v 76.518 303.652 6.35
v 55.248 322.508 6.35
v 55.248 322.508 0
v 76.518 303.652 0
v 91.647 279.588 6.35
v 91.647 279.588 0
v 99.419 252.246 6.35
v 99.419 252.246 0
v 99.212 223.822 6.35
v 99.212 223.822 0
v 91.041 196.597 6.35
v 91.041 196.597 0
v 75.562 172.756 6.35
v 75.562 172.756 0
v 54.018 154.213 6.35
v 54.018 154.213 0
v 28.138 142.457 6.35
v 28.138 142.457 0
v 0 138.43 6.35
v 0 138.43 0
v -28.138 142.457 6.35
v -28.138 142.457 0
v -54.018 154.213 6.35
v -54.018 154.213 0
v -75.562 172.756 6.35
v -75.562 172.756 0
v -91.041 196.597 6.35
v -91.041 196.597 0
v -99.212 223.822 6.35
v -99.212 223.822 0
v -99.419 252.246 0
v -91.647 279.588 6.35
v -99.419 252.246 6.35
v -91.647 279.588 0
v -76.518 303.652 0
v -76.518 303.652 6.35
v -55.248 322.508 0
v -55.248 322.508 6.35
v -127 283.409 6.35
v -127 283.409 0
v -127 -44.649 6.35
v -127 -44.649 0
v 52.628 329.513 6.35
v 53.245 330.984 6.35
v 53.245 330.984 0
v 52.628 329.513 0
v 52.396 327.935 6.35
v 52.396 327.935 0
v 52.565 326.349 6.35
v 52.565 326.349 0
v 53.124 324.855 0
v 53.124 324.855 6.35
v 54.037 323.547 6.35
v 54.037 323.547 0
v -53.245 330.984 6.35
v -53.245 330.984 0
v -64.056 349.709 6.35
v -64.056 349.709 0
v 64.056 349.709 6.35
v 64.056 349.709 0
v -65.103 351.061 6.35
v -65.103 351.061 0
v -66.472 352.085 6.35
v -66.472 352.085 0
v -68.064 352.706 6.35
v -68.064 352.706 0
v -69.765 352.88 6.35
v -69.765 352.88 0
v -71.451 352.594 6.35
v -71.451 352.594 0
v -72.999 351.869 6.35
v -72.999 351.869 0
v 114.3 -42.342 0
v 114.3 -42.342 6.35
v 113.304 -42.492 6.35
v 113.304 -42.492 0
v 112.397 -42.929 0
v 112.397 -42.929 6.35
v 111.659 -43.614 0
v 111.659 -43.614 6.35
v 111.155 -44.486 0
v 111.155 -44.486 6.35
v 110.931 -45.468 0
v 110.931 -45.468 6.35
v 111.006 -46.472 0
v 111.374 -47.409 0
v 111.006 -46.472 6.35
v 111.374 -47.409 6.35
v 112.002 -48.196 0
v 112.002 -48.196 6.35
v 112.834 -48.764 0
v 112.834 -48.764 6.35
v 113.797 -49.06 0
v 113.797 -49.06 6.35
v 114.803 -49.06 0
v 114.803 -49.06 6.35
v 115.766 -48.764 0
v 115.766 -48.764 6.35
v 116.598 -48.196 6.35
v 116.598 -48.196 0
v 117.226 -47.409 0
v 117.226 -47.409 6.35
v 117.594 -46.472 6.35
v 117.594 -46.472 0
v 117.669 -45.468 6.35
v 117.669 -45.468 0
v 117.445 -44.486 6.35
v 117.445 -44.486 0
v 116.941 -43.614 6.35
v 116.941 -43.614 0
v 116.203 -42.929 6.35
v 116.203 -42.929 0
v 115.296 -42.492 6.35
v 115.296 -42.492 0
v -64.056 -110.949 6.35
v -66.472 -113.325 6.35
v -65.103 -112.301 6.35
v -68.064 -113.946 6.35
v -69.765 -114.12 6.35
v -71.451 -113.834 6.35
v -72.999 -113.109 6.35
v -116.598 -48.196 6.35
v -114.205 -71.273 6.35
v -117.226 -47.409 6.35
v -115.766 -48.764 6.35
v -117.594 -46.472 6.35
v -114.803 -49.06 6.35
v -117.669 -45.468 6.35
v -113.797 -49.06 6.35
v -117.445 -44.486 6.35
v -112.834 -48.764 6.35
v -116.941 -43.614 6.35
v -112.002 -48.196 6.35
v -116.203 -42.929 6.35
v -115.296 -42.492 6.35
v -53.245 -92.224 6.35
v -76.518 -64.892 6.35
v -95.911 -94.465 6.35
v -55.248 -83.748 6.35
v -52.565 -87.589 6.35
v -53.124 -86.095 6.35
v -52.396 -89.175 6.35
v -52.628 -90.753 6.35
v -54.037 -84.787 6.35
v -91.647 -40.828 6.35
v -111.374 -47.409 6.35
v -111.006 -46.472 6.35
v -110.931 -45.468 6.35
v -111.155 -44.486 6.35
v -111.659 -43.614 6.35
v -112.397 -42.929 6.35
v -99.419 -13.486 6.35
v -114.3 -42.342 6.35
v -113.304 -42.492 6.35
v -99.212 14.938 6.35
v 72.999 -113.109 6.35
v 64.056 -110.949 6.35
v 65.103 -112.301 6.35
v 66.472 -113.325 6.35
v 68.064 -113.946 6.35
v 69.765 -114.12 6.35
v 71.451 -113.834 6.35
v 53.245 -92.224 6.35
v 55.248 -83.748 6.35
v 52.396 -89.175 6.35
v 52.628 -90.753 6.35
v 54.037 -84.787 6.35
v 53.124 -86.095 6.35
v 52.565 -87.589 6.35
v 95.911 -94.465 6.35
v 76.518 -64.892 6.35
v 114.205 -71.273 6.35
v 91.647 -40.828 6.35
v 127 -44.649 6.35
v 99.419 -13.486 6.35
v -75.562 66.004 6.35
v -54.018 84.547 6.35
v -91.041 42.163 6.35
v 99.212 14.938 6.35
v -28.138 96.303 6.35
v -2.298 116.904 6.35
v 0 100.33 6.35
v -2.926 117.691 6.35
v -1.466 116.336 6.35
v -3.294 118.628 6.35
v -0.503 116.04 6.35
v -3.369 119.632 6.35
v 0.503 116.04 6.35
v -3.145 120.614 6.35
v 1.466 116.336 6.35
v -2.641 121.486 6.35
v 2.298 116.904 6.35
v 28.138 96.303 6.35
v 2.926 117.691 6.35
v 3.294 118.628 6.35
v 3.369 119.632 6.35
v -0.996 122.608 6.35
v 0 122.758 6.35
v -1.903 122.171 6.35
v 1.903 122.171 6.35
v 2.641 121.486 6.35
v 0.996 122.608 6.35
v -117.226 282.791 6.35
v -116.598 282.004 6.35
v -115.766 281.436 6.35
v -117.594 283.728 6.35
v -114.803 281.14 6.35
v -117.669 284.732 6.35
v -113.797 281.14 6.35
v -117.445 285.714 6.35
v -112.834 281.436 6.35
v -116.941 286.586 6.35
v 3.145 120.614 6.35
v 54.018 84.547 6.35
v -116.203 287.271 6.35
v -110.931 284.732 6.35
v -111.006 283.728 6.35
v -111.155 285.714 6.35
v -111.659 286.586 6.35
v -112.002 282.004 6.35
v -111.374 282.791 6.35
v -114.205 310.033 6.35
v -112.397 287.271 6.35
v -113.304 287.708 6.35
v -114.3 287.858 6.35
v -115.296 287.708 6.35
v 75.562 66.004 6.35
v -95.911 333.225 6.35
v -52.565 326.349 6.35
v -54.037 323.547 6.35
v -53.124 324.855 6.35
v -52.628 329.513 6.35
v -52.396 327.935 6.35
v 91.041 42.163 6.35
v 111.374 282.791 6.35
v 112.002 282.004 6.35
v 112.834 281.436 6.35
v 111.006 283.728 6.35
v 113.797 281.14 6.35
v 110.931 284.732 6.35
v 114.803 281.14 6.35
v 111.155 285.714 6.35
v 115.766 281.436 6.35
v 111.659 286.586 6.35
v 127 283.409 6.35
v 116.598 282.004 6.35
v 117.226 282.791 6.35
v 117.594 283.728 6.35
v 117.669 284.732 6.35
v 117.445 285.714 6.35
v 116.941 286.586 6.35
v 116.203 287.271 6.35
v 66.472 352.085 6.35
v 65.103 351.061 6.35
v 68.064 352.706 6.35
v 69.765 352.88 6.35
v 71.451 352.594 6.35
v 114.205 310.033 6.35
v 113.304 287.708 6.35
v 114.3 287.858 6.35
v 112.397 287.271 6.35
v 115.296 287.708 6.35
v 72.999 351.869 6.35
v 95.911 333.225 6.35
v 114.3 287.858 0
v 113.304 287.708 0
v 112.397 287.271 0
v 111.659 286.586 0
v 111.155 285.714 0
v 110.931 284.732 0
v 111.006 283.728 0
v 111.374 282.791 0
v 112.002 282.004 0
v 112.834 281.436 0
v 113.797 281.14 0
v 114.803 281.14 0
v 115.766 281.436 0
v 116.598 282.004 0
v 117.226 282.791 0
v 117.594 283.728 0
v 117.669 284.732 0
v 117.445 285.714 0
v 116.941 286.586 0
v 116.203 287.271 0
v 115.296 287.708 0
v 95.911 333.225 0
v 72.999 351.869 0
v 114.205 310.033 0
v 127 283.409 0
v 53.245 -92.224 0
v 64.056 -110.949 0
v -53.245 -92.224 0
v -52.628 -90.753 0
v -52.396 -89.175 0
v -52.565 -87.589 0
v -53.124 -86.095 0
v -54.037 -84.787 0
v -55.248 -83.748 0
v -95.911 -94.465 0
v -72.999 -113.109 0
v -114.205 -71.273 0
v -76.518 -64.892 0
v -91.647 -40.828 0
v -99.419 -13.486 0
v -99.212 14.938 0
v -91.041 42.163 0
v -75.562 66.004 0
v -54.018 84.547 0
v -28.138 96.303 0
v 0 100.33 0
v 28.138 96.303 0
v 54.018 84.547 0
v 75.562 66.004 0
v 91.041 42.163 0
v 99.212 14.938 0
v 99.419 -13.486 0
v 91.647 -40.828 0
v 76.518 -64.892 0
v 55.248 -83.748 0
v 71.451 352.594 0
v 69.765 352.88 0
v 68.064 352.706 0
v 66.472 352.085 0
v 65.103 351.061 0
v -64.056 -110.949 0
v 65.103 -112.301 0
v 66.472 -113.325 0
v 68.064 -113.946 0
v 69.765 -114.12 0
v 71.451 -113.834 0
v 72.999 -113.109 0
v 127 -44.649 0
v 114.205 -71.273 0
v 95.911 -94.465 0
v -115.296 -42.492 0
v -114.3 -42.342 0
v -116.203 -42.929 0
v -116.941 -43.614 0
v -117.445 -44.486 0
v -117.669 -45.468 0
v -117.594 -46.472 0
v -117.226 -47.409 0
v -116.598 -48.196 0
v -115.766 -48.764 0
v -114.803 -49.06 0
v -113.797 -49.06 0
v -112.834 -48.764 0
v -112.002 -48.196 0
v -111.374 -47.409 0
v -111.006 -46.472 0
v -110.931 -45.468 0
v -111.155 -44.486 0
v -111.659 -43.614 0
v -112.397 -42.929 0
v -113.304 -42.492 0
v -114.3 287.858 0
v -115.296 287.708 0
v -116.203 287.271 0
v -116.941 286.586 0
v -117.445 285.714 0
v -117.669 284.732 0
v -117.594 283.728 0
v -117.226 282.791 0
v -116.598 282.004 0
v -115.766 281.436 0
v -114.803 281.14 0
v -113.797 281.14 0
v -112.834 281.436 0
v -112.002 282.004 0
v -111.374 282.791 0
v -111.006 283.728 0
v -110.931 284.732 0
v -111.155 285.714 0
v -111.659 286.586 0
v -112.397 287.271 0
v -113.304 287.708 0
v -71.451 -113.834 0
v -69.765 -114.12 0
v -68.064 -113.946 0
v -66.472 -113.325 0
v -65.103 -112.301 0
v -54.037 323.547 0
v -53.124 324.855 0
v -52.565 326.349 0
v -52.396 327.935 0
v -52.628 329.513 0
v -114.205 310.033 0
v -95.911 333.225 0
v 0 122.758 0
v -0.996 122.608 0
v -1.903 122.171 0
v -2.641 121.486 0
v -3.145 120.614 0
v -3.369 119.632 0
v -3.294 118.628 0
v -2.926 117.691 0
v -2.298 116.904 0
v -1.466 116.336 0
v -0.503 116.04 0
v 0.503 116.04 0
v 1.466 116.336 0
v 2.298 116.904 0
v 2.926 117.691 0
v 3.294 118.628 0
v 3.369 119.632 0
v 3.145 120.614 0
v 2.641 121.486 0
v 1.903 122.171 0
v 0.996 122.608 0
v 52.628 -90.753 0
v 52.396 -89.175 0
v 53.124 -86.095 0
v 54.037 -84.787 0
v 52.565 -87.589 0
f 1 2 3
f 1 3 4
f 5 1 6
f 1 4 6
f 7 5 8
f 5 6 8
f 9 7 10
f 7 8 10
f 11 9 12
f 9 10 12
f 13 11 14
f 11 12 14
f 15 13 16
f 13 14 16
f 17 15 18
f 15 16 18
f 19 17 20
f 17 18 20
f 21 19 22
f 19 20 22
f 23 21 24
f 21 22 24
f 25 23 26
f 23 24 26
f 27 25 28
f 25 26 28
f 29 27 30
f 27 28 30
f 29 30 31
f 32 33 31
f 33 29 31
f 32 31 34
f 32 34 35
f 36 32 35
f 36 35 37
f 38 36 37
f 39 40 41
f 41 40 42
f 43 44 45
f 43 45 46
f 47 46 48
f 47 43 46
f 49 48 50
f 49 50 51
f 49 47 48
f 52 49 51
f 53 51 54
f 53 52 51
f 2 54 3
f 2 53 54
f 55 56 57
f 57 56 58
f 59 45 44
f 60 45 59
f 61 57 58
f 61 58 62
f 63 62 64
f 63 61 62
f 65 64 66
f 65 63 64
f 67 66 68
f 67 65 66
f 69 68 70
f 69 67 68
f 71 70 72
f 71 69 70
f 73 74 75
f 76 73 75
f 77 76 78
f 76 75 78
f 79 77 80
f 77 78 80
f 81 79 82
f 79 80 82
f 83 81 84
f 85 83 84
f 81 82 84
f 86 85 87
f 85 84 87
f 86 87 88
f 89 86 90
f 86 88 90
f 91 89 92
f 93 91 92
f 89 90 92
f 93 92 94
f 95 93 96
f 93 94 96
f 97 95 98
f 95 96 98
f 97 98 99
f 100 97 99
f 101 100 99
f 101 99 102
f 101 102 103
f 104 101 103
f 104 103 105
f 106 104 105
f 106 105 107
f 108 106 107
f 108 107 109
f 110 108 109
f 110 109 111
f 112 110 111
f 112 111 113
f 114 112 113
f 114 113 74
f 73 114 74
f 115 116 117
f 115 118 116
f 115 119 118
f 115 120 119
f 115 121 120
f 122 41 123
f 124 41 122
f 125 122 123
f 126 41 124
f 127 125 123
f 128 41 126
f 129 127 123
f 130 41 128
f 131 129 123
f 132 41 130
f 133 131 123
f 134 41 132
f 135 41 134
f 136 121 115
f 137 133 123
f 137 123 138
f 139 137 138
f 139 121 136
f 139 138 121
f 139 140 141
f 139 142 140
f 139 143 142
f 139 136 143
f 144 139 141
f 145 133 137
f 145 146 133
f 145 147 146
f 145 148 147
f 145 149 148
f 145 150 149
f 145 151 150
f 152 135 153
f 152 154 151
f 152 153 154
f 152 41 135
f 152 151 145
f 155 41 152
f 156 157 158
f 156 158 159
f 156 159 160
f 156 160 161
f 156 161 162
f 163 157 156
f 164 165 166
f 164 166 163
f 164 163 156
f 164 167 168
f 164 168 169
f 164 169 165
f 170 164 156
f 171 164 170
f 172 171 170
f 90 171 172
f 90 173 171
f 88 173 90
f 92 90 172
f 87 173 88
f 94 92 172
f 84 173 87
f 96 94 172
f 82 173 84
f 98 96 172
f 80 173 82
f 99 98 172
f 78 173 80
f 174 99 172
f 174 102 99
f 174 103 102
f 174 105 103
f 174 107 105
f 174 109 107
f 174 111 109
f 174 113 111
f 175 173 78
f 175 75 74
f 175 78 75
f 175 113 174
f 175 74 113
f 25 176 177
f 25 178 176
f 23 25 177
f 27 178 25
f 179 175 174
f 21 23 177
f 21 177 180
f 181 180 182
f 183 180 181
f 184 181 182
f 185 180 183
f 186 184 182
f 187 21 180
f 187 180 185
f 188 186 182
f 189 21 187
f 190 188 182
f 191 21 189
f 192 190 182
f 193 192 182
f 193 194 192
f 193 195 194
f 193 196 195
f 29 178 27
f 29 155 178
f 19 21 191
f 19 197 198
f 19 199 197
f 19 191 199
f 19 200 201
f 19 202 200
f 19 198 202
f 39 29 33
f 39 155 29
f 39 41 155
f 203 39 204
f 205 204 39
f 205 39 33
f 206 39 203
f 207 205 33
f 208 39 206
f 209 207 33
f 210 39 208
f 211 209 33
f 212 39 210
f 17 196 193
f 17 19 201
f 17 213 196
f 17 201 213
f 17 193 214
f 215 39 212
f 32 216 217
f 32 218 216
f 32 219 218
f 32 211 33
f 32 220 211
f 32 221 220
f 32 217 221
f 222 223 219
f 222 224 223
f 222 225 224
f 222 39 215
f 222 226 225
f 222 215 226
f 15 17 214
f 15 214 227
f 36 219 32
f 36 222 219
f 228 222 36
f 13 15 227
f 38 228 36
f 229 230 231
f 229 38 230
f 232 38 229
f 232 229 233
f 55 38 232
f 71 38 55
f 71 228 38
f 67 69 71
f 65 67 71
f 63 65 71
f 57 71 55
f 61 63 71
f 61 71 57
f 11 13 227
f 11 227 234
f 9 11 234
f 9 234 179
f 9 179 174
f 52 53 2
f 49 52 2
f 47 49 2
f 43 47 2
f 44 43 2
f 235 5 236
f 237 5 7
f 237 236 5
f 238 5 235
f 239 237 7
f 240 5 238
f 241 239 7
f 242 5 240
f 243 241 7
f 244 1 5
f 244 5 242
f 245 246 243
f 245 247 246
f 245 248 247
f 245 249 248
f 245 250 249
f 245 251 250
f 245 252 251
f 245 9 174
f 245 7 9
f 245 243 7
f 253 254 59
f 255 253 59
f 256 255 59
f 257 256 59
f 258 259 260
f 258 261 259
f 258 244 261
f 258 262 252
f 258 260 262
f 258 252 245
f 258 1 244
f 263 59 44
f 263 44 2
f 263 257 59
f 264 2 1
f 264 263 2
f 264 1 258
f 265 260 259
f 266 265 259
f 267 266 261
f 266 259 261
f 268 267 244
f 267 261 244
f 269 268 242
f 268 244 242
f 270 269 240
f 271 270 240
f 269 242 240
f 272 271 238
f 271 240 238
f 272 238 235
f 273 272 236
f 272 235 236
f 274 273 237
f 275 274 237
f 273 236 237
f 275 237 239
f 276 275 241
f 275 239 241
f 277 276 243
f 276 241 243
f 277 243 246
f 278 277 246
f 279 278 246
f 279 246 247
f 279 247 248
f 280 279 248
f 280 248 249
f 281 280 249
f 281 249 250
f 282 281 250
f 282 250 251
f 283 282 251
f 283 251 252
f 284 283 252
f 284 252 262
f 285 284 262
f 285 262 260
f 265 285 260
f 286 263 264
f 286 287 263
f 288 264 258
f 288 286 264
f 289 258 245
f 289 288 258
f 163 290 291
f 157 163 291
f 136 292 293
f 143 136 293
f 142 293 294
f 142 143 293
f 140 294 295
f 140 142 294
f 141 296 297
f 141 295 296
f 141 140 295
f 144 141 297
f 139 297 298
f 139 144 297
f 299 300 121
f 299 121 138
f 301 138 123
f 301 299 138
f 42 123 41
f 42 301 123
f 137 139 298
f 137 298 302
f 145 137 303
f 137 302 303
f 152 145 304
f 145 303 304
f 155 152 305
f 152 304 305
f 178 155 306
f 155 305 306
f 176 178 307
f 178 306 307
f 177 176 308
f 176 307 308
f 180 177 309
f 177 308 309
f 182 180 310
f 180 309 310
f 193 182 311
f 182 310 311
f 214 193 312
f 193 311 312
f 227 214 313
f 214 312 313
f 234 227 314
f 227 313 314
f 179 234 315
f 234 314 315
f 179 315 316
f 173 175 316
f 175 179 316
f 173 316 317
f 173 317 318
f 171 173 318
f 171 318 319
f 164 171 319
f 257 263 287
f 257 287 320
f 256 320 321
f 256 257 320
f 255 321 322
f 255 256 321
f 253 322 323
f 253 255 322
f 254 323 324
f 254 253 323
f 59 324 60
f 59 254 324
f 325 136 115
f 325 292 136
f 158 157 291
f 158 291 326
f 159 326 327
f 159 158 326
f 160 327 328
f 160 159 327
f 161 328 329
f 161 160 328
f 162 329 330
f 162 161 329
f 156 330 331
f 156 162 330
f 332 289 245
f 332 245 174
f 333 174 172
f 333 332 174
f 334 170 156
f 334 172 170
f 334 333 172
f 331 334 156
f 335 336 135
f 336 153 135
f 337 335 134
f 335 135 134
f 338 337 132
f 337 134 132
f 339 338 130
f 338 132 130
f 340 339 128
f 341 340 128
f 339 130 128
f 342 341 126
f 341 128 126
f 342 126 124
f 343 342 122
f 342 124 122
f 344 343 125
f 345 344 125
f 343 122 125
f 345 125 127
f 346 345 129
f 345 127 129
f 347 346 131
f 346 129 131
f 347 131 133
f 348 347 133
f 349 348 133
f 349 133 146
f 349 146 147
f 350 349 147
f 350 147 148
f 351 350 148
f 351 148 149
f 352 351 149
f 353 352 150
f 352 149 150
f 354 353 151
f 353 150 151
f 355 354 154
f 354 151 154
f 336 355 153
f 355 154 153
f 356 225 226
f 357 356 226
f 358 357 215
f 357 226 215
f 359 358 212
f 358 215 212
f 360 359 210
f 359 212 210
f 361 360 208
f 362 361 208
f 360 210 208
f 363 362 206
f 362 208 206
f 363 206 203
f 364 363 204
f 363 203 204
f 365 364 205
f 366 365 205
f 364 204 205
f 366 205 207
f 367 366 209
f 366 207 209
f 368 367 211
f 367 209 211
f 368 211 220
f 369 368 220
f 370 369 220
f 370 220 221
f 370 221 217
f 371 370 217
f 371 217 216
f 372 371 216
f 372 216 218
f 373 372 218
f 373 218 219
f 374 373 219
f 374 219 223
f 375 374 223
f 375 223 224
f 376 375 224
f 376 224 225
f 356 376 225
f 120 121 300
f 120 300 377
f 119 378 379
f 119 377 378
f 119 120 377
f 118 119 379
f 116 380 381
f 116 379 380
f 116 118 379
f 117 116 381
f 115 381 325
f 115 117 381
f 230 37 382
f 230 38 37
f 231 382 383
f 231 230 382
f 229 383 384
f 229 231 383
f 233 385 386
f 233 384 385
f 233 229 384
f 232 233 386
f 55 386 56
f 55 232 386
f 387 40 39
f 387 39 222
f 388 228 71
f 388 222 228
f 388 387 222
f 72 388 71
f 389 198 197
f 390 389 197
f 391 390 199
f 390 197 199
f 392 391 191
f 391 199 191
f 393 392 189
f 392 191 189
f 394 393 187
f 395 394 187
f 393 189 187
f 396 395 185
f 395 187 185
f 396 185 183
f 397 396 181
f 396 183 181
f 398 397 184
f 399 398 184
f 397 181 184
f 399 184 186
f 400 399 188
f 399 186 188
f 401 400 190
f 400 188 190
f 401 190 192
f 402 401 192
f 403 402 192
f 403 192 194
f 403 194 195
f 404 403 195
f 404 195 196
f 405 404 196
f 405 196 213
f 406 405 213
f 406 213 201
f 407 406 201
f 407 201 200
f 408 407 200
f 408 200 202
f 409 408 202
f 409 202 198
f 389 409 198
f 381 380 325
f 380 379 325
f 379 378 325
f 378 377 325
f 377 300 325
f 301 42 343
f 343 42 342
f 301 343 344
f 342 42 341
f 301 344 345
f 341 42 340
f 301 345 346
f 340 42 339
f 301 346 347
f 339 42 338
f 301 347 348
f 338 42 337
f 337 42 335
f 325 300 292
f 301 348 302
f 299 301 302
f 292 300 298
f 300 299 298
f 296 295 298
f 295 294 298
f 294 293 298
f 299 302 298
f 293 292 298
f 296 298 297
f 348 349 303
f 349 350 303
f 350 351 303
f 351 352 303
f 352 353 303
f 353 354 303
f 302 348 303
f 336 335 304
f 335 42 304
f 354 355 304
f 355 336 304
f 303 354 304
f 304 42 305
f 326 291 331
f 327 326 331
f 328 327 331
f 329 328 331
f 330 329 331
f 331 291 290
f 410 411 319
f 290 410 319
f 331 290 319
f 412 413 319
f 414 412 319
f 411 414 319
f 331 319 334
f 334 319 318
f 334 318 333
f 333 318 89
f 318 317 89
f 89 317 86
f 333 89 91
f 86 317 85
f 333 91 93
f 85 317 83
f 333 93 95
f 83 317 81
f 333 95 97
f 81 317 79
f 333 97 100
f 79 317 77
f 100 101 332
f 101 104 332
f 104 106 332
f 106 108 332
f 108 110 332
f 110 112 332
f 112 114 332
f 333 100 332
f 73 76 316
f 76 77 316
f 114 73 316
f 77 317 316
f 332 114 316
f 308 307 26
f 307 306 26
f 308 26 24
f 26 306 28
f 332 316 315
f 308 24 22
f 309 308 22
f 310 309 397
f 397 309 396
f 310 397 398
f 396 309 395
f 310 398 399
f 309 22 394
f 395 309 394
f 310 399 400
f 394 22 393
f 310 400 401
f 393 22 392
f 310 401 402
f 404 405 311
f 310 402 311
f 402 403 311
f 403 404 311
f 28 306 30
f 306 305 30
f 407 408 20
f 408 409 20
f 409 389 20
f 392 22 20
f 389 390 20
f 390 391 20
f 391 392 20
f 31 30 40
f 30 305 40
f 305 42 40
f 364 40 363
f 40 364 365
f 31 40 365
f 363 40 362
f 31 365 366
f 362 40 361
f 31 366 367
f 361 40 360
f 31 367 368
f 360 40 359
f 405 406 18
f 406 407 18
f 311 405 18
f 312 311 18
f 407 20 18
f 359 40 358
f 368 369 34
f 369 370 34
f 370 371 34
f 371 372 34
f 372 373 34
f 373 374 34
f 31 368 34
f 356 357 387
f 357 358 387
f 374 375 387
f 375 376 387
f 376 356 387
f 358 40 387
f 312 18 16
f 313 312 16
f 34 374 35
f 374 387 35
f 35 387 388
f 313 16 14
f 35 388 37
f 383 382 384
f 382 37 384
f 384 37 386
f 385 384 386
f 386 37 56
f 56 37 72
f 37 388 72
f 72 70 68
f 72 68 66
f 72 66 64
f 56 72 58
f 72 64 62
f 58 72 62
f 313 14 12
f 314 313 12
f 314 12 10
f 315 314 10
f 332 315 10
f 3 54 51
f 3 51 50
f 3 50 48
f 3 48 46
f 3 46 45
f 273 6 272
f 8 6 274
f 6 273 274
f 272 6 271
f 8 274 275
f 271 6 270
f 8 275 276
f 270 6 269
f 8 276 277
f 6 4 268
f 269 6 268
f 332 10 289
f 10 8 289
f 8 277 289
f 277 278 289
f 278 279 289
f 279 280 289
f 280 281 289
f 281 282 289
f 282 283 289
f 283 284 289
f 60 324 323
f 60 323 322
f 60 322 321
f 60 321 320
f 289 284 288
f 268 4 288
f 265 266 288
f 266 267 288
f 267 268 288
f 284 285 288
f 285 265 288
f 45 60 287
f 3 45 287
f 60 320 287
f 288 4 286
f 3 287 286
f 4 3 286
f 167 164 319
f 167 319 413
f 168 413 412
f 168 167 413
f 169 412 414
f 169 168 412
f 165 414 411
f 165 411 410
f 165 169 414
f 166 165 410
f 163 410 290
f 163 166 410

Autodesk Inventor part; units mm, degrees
ref_plane "YZ Plane" through (0, 0, 0) normal (1, 0, 0) x (0, 1, 0)
ref_plane "XZ Plane" through (0, 0, 0) normal (0, 1, 0) x (-1, 0, 0)
ref_plane "XY Plane" through (0, 0, 0) normal (0, 0, 1) x (1, 0, 0)
sketch "Sketch1" plane through (0, 0, 0) normal (0, 0, 1) x (1, 0, 0)
  arc A0 (50.165, -86.8883) -> (-50.165, -86.8883) centre (0, 0) ccw
  line L0 (0, 123.825) -> (0, 0) construction
  line L1 (-168.8677, 119.38) -> (168.8677, 119.38) construction
  line L2 (127, 119.38) -> (127, -44.6491)
  line L3 (0, 0) -> (67.31, -116.5843) construction
  line L4 (50.165, -86.8883) -> (67.31, -116.5843)
  line L5 (-127, 119.38) -> (-127, -44.6491)
  line L6 (0, 0) -> (-67.31, -116.5843) construction
  line L7 (-50.165, -86.8883) -> (-67.31, -116.5843)
  arc A1 (-50.165, 325.6483) -> (50.165, 325.6483) centre (0, 238.76) ccw
  line L8 (127, 119.38) -> (127, 283.4091)
  line L9 (50.165, 325.6483) -> (67.31, 355.3443)
  line L10 (-127, 119.38) -> (-127, 283.4091)
  line L11 (-50.165, 325.6483) -> (-67.31, 355.3443)
  arc A2 (127, 283.4091) -> (67.31, 355.3443) centre (0, 238.76) ccw
  arc A3 (-67.31, 355.3443) -> (-127, 283.4091) centre (0, 238.76) ccw
  arc A4 (-127, -44.6491) -> (-67.31, -116.5843) centre (0, 0) ccw
  arc A5 (67.31, -116.5843) -> (127, -44.6491) centre (0, 0) ccw
  point P0 (114.3, -45.72)
  point P1 (0, 119.38)
  point P2 (-114.3, -45.72)
  point P3 (114.3, 284.48)
  point P4 (-114.3, 284.48)
  dimension "d1" = 200.66
  dimension "d18" = 119.38
  dimension "d19" = 165.1
  dimension "d20" = 114.3
  dimension "d25" = 127
  dimension "d26" = 150
  dimension "d34" = 134.62
extrude "Extrusion1" add sketch "Sketch1" along normal blind 6.35
hole "Hole2" at (114.3, -45.72, 0) at (0, 119.38, 0) at (-114.3, -45.72, 0) at (114.3, 284.48, 0) at (-114.3, 284.48, 0) direction (0, 0, 1) diameter 6.7564 end through all clearance for "Flat Head Machine Screw (82)" size "1/4" standard "Ansi Unified Screw Threads"
fillet "Fillet1" radius 6.35 8 edges at (50.165, -86.8883, 3.175) (-50.165, -86.8883, 3.175) (67.31, 355.3443, 3.175) (-67.31, 355.3443, 3.175) (50.165, 325.6483, 3.175) (-50.165, 325.6483, 3.175) (67.31, -116.5843, 3.175) (-67.31, -116.5843, 3.175)
properties part number "J001393" material "ALUMINUM, 6061-T651"
